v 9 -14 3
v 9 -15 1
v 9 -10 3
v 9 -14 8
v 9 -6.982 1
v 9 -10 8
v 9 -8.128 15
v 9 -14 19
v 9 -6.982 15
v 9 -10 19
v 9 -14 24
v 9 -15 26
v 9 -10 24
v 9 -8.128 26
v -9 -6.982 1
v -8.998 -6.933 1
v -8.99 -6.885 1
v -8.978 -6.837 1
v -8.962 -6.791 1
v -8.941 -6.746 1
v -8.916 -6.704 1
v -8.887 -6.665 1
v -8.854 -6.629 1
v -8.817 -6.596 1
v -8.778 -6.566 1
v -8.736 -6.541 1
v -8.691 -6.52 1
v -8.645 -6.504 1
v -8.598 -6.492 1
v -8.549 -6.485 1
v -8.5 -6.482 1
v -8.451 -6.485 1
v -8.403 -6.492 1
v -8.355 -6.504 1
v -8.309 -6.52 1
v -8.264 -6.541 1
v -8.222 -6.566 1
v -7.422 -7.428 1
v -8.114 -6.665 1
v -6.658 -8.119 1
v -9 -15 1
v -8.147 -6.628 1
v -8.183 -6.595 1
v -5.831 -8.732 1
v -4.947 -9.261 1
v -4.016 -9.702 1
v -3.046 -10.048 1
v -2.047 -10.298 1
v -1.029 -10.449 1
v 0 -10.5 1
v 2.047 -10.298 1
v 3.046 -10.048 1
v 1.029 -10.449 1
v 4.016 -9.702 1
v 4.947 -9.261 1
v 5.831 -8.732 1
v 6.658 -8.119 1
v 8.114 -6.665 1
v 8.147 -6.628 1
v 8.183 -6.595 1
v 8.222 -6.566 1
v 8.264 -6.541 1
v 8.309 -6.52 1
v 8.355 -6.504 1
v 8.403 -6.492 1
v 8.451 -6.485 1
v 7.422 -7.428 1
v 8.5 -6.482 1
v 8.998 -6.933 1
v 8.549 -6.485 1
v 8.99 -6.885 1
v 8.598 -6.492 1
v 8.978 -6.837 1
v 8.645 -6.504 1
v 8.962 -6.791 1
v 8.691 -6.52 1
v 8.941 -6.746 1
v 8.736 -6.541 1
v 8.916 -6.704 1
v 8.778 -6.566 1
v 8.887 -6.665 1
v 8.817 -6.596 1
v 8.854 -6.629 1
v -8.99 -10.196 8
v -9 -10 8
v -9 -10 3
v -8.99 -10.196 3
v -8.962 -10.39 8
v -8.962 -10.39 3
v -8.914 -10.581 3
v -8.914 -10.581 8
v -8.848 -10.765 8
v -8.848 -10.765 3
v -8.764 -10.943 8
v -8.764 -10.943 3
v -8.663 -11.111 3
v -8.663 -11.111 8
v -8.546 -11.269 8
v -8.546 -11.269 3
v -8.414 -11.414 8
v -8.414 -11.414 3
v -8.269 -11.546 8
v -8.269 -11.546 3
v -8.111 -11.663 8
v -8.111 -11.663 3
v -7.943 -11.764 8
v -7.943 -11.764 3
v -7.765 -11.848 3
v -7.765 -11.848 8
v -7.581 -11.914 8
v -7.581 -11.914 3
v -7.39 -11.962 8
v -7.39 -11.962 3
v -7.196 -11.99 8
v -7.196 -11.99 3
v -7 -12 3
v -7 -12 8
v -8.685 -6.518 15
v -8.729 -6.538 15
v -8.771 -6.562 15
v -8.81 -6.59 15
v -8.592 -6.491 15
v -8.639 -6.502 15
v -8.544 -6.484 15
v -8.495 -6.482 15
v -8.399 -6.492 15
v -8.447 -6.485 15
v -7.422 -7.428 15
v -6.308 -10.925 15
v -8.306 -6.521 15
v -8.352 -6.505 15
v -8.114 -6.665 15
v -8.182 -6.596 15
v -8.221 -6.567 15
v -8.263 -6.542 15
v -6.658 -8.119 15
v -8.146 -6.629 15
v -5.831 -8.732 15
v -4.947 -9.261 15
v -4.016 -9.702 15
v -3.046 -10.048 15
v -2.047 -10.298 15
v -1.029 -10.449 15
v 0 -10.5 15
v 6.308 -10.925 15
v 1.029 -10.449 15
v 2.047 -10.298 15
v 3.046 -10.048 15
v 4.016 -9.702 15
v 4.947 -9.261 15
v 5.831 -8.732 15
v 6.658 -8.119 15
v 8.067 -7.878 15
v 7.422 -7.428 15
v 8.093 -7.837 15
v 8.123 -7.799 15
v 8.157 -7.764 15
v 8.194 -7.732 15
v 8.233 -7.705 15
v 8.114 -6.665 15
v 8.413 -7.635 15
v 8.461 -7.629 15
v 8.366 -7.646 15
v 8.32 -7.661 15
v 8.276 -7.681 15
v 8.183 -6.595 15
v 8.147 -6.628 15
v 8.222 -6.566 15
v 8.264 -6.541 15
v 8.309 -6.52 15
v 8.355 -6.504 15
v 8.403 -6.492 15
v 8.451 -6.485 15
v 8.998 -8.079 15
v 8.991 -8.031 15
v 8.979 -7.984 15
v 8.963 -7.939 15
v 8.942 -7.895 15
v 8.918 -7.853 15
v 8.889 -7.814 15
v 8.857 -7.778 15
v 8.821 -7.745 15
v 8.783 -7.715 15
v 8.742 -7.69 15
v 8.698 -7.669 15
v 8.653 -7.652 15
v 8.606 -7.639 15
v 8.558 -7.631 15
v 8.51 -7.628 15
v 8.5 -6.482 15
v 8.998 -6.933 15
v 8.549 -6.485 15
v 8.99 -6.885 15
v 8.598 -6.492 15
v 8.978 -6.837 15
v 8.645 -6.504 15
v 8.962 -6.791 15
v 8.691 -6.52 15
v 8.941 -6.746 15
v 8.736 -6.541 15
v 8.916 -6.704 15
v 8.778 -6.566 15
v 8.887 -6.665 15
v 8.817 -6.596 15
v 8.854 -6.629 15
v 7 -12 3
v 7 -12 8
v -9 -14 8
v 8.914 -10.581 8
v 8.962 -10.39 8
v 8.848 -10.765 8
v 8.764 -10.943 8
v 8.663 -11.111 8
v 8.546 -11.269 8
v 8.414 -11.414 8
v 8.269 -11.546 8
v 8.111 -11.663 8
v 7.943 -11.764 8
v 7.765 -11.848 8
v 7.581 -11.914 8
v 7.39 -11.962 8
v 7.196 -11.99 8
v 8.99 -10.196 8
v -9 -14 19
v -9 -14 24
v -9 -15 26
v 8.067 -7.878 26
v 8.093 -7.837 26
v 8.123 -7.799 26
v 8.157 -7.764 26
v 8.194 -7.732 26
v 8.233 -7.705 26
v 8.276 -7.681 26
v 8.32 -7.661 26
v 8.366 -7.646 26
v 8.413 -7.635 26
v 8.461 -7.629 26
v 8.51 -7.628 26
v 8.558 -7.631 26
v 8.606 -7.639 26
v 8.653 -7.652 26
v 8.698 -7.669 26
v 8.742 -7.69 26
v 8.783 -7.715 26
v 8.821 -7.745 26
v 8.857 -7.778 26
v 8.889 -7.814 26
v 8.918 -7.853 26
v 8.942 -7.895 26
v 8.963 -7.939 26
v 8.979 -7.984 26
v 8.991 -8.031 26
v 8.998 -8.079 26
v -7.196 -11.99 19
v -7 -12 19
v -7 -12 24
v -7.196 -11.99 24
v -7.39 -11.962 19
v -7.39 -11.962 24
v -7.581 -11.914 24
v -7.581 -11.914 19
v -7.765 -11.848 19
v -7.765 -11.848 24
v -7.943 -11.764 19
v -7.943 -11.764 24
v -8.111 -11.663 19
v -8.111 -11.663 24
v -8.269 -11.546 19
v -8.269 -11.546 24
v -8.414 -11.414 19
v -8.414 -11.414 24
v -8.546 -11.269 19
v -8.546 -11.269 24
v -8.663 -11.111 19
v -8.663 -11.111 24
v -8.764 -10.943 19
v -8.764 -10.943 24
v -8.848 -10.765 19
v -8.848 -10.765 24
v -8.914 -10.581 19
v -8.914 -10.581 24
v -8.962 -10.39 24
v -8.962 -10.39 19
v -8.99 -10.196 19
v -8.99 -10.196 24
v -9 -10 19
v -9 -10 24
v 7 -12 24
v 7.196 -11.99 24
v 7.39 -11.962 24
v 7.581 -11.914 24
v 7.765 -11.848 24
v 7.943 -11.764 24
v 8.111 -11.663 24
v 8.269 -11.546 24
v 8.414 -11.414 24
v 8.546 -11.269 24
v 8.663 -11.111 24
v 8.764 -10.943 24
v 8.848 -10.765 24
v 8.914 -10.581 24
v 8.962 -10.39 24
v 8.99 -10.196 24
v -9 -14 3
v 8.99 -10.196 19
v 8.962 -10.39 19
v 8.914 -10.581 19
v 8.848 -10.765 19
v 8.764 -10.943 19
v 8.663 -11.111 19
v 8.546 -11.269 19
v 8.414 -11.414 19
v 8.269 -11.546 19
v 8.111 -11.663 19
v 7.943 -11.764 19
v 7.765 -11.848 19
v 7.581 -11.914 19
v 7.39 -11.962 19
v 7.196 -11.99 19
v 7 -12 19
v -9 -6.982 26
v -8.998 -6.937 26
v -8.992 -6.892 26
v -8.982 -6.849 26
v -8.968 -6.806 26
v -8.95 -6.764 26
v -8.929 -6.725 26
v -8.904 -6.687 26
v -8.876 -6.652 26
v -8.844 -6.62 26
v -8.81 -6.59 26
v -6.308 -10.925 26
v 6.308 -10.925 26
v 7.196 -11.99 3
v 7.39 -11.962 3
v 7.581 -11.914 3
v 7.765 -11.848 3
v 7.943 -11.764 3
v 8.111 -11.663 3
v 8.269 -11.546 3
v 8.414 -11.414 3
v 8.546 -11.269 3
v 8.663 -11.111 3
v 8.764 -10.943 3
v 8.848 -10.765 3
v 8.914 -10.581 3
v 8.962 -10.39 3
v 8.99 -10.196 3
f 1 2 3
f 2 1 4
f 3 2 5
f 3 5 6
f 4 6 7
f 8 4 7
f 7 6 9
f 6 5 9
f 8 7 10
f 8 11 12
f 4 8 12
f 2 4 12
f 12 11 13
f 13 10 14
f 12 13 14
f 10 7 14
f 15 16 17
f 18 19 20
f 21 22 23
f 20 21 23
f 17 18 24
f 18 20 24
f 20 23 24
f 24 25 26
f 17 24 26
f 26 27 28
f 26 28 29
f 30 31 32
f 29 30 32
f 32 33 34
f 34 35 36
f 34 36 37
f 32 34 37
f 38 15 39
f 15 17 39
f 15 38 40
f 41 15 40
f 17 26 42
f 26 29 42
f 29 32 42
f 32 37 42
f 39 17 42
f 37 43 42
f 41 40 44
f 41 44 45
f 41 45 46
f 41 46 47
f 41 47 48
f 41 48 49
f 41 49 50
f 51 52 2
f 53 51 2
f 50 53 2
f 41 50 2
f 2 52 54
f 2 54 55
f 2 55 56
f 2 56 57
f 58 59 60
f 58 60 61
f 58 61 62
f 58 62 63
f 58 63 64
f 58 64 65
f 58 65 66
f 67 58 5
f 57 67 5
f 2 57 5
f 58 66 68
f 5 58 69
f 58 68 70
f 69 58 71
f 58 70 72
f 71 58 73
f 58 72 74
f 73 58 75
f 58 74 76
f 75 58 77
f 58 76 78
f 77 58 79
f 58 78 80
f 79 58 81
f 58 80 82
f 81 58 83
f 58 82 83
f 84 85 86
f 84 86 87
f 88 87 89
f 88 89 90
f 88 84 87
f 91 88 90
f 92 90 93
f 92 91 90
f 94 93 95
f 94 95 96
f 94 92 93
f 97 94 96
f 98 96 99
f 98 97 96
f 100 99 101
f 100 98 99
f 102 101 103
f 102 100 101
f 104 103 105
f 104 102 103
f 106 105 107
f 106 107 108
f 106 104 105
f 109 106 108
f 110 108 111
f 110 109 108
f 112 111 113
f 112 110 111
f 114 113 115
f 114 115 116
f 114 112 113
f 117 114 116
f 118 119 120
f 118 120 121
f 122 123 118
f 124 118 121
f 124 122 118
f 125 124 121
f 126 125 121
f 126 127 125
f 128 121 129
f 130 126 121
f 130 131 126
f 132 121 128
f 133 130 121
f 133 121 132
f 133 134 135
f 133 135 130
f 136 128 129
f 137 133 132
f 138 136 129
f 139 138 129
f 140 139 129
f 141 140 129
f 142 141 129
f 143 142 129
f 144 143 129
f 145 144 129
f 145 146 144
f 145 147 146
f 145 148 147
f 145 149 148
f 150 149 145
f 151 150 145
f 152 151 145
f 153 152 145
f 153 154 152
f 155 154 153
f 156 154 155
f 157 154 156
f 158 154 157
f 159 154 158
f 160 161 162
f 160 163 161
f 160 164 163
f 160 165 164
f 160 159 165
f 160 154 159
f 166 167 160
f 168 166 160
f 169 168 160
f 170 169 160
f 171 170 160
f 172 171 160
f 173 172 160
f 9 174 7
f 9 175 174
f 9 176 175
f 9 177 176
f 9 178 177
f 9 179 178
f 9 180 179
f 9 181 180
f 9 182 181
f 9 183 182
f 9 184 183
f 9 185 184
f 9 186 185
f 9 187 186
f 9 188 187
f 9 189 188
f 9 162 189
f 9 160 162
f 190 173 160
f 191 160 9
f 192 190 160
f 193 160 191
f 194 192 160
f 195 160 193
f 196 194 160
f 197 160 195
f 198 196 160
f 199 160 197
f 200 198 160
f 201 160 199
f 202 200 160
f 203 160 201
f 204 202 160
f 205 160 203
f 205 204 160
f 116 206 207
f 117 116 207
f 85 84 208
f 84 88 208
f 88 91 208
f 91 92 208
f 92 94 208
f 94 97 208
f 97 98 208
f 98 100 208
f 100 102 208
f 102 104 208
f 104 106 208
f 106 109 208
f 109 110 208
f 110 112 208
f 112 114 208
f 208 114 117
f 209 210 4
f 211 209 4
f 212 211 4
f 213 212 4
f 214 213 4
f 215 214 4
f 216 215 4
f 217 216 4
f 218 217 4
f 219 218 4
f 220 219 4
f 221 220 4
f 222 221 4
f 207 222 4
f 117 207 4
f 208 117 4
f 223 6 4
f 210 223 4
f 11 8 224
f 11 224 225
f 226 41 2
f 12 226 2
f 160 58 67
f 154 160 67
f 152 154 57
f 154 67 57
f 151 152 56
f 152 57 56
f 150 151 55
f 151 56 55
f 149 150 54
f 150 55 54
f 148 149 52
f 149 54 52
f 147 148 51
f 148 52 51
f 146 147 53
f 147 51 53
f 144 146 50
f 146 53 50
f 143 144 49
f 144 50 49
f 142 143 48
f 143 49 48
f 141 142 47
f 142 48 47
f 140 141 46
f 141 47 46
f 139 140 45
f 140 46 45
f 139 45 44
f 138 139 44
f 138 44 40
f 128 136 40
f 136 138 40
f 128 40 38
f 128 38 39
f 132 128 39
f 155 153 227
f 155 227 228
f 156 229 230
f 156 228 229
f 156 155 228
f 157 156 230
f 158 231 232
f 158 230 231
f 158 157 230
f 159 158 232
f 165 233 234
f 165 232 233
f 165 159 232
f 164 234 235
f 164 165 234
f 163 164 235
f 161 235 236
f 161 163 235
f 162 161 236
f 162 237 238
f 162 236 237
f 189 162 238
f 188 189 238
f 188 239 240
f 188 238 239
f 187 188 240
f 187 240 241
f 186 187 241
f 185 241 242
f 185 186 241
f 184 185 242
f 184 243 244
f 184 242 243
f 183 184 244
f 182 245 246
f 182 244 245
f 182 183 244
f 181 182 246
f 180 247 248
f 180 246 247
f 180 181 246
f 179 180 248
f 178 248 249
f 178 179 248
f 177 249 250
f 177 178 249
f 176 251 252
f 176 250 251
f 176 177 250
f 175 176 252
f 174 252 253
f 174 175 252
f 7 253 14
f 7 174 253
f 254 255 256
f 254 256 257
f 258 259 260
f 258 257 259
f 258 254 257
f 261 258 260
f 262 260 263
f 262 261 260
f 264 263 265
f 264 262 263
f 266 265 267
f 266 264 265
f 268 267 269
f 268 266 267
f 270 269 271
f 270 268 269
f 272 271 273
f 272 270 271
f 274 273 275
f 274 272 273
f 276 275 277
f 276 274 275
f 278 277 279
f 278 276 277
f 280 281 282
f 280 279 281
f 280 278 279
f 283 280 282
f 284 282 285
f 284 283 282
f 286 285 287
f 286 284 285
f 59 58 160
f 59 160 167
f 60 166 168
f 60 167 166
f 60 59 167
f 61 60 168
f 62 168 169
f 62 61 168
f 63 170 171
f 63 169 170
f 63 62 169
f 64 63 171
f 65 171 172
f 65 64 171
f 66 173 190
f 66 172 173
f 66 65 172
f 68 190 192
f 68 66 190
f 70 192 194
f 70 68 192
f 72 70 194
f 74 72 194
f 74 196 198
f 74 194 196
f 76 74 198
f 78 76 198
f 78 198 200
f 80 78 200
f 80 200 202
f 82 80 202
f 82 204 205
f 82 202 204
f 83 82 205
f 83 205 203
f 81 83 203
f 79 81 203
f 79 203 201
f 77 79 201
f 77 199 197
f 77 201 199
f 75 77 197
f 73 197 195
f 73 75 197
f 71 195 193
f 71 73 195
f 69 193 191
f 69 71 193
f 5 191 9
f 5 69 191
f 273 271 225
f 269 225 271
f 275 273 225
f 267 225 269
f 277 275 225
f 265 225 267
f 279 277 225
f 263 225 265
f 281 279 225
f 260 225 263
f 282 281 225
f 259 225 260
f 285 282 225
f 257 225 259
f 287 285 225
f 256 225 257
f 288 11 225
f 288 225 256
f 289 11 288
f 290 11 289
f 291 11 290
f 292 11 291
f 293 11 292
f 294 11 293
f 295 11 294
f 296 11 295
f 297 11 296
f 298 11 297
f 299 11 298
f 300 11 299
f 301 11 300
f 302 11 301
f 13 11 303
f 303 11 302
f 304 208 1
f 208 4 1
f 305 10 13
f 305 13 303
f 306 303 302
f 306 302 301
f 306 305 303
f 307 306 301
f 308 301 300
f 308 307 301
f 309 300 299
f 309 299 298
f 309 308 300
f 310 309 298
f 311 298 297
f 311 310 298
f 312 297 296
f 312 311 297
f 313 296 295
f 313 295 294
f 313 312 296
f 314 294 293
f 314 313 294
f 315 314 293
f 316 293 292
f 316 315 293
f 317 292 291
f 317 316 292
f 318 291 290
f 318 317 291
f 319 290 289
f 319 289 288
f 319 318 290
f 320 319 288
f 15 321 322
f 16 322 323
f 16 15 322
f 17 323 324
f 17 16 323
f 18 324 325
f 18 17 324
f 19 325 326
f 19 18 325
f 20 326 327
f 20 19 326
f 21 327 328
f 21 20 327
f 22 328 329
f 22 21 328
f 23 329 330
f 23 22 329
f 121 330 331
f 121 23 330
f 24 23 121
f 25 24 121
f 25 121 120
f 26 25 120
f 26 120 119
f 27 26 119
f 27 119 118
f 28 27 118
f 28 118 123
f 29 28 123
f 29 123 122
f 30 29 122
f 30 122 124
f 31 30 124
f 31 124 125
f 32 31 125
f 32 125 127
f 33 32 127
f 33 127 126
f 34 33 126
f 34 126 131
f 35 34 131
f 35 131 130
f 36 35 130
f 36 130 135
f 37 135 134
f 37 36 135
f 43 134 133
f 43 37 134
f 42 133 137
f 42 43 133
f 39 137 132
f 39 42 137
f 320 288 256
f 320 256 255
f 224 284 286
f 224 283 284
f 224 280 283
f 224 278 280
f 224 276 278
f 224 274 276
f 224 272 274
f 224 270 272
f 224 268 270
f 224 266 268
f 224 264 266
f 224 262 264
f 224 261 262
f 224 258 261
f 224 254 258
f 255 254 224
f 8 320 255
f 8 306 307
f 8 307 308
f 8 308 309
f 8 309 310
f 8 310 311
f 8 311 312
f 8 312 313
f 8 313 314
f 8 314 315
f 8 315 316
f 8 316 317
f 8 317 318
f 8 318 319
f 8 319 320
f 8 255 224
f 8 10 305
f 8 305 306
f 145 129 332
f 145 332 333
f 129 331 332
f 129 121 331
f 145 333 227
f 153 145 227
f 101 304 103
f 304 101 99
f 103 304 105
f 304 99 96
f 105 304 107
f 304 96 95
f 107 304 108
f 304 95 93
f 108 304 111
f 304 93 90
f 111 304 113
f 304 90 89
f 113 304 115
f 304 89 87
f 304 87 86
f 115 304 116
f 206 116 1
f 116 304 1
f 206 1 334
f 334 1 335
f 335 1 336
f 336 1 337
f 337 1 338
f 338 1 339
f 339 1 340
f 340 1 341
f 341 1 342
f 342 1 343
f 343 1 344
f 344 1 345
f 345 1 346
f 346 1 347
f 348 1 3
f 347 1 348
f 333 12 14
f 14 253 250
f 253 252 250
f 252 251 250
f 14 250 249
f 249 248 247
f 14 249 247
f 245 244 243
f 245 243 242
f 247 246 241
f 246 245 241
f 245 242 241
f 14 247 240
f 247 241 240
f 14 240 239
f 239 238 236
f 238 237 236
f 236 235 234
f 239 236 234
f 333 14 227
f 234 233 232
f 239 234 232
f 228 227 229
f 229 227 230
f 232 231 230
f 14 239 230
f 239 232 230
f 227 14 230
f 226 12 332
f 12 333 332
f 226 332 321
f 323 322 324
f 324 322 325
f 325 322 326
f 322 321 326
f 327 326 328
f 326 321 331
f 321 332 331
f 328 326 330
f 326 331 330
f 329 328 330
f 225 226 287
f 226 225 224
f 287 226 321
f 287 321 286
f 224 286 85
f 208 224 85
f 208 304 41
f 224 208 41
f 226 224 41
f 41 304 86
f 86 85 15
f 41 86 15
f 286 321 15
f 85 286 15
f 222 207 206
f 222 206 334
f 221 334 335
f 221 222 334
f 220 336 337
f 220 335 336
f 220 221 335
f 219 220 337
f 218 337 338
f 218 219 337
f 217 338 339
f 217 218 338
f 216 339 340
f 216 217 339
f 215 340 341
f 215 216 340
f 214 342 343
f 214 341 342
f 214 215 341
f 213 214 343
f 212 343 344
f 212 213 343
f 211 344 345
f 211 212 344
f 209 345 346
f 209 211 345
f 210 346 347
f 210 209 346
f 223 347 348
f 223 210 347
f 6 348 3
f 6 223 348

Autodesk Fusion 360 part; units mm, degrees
sketch "Sketch1" plane through (0, 0, 0) normal (0, 0, 1) x (1, 0, 0)
  circle A0 centre (0, 0) radius 10.5
  line L0 (-6.3076, 10.925) -> (-12.6151, 0)
  line L1 (-12.6151, 0) -> (-6.3076, -10.925)
  line L2 (-6.3076, -10.925) -> (6.3076, -10.925)
  line L3 (6.3076, -10.925) -> (12.6151, 0)
  line L4 (12.6151, 0) -> (6.3076, 10.925)
  line L5 (6.3076, 10.925) -> (-6.3076, 10.925)
  line L6 (-4.6188, 8) -> (-9.2376, 0)
  line L7 (-9.2376, 0) -> (-4.6188, -8)
  line L8 (-4.6188, -8) -> (4.6188, -8)
  line L9 (4.6188, -8) -> (9.2376, 0)
  line L10 (9.2376, 0) -> (4.6188, 8)
  line L11 (4.6188, 8) -> (-4.6188, 8)
  dimension "d2" = 21
  dimension "d3" = 10.925
  dimension "d15" = 8
extrude "Extrude2" add sketch "Sketch1" along normal blind 15 contours A0 | L6 L7 L8 L9 L10 L11 makes body 1
extrude "Extrude3" add sketch "Sketch1" along normal blind 12 from surface at 15 contours A0 | L0 L1 L2 L3 L4 L5 | L6 L7 L8 L9 L10 L11 bodies 1
extrude "Extrude4" add sketch "Sketch1" along normal blind 17 from surface at 27 contours L6 L7 L8 L9 L10 L11 bodies 1
sketch "Sketch2" plane through (0, 0, 0) normal (0, 1, 0) x (1, 0, 0)
  line L0 (-9, -1) -> (9, -1)
  line L1 (9, -1) -> (9, -26)
  line L2 (9, -26) -> (-9, -26)
  line L3 (-9, -26) -> (-9, -1)
extrude "Extrude5" add sketch "Sketch2" against normal blind 15 separate body makes body 2
combine "Combine1" operation cut target body 2 tool bodies 1 keep tools
sketch "Sketch3" plane through (9, 0, 0) normal (1, 0, 0) x (0, 1, 0)
  line L0 (-6.2615, 15) -> (-6.2615, 26)
  line L1 (-6.2615, 26) -> (-15, 26)
  line L2 (-15, 26) -> (-15, 1)
  line L3 (-15, 1) -> (-5.4083, 1)
  line L4 (-5.4083, 1) -> (-5.4083, 15)
  line L5 (-5.4083, 15) -> (-6.2615, 15)
  line L6 (-14, 24) -> (-12, 24)
  line L7 (-12, 24) -> (-12, 19)
  line L8 (-12, 19) -> (-14, 19)
  line L9 (-14, 19) -> (-14, 24)
  line L10 (-14, 3) -> (-12, 3)
  line L11 (-12, 3) -> (-12, 8)
  line L12 (-12, 8) -> (-14, 8)
  line L13 (-14, 8) -> (-14, 3)
  dimension "d24" = 2
  dimension "d25" = 5
  dimension "d26" = 2
  dimension "d27" = 5
  dimension "d28" = 2
  dimension "d29" = 2
extrude "Extrude6" cut sketch "Sketch3" against normal blind 28 contours L6 L7 L8 L9 | L10 L11 L12 L13 bodies 2
fillet "Fillet1" radius 2 4 edges at (9, -12, 21.5) (9, -12, 5.5) (-9, -12, 21.5) (-9, -12, 5.5) on bodies 2
fillet "Fillet2" radius 0.5 4 edges at (-9, -5.4083, 8) (-9, -6.2615, 20.5) (9, -6.2615, 20.5) (9, -5.4083, 8) on bodies 2
hidden bodies 1
equation "d3 = 21.85 mm / 2"
equation "d26 = d24"
equation "d27 = d25"
equation "d28 = d24"
equation "d29 = d24"
